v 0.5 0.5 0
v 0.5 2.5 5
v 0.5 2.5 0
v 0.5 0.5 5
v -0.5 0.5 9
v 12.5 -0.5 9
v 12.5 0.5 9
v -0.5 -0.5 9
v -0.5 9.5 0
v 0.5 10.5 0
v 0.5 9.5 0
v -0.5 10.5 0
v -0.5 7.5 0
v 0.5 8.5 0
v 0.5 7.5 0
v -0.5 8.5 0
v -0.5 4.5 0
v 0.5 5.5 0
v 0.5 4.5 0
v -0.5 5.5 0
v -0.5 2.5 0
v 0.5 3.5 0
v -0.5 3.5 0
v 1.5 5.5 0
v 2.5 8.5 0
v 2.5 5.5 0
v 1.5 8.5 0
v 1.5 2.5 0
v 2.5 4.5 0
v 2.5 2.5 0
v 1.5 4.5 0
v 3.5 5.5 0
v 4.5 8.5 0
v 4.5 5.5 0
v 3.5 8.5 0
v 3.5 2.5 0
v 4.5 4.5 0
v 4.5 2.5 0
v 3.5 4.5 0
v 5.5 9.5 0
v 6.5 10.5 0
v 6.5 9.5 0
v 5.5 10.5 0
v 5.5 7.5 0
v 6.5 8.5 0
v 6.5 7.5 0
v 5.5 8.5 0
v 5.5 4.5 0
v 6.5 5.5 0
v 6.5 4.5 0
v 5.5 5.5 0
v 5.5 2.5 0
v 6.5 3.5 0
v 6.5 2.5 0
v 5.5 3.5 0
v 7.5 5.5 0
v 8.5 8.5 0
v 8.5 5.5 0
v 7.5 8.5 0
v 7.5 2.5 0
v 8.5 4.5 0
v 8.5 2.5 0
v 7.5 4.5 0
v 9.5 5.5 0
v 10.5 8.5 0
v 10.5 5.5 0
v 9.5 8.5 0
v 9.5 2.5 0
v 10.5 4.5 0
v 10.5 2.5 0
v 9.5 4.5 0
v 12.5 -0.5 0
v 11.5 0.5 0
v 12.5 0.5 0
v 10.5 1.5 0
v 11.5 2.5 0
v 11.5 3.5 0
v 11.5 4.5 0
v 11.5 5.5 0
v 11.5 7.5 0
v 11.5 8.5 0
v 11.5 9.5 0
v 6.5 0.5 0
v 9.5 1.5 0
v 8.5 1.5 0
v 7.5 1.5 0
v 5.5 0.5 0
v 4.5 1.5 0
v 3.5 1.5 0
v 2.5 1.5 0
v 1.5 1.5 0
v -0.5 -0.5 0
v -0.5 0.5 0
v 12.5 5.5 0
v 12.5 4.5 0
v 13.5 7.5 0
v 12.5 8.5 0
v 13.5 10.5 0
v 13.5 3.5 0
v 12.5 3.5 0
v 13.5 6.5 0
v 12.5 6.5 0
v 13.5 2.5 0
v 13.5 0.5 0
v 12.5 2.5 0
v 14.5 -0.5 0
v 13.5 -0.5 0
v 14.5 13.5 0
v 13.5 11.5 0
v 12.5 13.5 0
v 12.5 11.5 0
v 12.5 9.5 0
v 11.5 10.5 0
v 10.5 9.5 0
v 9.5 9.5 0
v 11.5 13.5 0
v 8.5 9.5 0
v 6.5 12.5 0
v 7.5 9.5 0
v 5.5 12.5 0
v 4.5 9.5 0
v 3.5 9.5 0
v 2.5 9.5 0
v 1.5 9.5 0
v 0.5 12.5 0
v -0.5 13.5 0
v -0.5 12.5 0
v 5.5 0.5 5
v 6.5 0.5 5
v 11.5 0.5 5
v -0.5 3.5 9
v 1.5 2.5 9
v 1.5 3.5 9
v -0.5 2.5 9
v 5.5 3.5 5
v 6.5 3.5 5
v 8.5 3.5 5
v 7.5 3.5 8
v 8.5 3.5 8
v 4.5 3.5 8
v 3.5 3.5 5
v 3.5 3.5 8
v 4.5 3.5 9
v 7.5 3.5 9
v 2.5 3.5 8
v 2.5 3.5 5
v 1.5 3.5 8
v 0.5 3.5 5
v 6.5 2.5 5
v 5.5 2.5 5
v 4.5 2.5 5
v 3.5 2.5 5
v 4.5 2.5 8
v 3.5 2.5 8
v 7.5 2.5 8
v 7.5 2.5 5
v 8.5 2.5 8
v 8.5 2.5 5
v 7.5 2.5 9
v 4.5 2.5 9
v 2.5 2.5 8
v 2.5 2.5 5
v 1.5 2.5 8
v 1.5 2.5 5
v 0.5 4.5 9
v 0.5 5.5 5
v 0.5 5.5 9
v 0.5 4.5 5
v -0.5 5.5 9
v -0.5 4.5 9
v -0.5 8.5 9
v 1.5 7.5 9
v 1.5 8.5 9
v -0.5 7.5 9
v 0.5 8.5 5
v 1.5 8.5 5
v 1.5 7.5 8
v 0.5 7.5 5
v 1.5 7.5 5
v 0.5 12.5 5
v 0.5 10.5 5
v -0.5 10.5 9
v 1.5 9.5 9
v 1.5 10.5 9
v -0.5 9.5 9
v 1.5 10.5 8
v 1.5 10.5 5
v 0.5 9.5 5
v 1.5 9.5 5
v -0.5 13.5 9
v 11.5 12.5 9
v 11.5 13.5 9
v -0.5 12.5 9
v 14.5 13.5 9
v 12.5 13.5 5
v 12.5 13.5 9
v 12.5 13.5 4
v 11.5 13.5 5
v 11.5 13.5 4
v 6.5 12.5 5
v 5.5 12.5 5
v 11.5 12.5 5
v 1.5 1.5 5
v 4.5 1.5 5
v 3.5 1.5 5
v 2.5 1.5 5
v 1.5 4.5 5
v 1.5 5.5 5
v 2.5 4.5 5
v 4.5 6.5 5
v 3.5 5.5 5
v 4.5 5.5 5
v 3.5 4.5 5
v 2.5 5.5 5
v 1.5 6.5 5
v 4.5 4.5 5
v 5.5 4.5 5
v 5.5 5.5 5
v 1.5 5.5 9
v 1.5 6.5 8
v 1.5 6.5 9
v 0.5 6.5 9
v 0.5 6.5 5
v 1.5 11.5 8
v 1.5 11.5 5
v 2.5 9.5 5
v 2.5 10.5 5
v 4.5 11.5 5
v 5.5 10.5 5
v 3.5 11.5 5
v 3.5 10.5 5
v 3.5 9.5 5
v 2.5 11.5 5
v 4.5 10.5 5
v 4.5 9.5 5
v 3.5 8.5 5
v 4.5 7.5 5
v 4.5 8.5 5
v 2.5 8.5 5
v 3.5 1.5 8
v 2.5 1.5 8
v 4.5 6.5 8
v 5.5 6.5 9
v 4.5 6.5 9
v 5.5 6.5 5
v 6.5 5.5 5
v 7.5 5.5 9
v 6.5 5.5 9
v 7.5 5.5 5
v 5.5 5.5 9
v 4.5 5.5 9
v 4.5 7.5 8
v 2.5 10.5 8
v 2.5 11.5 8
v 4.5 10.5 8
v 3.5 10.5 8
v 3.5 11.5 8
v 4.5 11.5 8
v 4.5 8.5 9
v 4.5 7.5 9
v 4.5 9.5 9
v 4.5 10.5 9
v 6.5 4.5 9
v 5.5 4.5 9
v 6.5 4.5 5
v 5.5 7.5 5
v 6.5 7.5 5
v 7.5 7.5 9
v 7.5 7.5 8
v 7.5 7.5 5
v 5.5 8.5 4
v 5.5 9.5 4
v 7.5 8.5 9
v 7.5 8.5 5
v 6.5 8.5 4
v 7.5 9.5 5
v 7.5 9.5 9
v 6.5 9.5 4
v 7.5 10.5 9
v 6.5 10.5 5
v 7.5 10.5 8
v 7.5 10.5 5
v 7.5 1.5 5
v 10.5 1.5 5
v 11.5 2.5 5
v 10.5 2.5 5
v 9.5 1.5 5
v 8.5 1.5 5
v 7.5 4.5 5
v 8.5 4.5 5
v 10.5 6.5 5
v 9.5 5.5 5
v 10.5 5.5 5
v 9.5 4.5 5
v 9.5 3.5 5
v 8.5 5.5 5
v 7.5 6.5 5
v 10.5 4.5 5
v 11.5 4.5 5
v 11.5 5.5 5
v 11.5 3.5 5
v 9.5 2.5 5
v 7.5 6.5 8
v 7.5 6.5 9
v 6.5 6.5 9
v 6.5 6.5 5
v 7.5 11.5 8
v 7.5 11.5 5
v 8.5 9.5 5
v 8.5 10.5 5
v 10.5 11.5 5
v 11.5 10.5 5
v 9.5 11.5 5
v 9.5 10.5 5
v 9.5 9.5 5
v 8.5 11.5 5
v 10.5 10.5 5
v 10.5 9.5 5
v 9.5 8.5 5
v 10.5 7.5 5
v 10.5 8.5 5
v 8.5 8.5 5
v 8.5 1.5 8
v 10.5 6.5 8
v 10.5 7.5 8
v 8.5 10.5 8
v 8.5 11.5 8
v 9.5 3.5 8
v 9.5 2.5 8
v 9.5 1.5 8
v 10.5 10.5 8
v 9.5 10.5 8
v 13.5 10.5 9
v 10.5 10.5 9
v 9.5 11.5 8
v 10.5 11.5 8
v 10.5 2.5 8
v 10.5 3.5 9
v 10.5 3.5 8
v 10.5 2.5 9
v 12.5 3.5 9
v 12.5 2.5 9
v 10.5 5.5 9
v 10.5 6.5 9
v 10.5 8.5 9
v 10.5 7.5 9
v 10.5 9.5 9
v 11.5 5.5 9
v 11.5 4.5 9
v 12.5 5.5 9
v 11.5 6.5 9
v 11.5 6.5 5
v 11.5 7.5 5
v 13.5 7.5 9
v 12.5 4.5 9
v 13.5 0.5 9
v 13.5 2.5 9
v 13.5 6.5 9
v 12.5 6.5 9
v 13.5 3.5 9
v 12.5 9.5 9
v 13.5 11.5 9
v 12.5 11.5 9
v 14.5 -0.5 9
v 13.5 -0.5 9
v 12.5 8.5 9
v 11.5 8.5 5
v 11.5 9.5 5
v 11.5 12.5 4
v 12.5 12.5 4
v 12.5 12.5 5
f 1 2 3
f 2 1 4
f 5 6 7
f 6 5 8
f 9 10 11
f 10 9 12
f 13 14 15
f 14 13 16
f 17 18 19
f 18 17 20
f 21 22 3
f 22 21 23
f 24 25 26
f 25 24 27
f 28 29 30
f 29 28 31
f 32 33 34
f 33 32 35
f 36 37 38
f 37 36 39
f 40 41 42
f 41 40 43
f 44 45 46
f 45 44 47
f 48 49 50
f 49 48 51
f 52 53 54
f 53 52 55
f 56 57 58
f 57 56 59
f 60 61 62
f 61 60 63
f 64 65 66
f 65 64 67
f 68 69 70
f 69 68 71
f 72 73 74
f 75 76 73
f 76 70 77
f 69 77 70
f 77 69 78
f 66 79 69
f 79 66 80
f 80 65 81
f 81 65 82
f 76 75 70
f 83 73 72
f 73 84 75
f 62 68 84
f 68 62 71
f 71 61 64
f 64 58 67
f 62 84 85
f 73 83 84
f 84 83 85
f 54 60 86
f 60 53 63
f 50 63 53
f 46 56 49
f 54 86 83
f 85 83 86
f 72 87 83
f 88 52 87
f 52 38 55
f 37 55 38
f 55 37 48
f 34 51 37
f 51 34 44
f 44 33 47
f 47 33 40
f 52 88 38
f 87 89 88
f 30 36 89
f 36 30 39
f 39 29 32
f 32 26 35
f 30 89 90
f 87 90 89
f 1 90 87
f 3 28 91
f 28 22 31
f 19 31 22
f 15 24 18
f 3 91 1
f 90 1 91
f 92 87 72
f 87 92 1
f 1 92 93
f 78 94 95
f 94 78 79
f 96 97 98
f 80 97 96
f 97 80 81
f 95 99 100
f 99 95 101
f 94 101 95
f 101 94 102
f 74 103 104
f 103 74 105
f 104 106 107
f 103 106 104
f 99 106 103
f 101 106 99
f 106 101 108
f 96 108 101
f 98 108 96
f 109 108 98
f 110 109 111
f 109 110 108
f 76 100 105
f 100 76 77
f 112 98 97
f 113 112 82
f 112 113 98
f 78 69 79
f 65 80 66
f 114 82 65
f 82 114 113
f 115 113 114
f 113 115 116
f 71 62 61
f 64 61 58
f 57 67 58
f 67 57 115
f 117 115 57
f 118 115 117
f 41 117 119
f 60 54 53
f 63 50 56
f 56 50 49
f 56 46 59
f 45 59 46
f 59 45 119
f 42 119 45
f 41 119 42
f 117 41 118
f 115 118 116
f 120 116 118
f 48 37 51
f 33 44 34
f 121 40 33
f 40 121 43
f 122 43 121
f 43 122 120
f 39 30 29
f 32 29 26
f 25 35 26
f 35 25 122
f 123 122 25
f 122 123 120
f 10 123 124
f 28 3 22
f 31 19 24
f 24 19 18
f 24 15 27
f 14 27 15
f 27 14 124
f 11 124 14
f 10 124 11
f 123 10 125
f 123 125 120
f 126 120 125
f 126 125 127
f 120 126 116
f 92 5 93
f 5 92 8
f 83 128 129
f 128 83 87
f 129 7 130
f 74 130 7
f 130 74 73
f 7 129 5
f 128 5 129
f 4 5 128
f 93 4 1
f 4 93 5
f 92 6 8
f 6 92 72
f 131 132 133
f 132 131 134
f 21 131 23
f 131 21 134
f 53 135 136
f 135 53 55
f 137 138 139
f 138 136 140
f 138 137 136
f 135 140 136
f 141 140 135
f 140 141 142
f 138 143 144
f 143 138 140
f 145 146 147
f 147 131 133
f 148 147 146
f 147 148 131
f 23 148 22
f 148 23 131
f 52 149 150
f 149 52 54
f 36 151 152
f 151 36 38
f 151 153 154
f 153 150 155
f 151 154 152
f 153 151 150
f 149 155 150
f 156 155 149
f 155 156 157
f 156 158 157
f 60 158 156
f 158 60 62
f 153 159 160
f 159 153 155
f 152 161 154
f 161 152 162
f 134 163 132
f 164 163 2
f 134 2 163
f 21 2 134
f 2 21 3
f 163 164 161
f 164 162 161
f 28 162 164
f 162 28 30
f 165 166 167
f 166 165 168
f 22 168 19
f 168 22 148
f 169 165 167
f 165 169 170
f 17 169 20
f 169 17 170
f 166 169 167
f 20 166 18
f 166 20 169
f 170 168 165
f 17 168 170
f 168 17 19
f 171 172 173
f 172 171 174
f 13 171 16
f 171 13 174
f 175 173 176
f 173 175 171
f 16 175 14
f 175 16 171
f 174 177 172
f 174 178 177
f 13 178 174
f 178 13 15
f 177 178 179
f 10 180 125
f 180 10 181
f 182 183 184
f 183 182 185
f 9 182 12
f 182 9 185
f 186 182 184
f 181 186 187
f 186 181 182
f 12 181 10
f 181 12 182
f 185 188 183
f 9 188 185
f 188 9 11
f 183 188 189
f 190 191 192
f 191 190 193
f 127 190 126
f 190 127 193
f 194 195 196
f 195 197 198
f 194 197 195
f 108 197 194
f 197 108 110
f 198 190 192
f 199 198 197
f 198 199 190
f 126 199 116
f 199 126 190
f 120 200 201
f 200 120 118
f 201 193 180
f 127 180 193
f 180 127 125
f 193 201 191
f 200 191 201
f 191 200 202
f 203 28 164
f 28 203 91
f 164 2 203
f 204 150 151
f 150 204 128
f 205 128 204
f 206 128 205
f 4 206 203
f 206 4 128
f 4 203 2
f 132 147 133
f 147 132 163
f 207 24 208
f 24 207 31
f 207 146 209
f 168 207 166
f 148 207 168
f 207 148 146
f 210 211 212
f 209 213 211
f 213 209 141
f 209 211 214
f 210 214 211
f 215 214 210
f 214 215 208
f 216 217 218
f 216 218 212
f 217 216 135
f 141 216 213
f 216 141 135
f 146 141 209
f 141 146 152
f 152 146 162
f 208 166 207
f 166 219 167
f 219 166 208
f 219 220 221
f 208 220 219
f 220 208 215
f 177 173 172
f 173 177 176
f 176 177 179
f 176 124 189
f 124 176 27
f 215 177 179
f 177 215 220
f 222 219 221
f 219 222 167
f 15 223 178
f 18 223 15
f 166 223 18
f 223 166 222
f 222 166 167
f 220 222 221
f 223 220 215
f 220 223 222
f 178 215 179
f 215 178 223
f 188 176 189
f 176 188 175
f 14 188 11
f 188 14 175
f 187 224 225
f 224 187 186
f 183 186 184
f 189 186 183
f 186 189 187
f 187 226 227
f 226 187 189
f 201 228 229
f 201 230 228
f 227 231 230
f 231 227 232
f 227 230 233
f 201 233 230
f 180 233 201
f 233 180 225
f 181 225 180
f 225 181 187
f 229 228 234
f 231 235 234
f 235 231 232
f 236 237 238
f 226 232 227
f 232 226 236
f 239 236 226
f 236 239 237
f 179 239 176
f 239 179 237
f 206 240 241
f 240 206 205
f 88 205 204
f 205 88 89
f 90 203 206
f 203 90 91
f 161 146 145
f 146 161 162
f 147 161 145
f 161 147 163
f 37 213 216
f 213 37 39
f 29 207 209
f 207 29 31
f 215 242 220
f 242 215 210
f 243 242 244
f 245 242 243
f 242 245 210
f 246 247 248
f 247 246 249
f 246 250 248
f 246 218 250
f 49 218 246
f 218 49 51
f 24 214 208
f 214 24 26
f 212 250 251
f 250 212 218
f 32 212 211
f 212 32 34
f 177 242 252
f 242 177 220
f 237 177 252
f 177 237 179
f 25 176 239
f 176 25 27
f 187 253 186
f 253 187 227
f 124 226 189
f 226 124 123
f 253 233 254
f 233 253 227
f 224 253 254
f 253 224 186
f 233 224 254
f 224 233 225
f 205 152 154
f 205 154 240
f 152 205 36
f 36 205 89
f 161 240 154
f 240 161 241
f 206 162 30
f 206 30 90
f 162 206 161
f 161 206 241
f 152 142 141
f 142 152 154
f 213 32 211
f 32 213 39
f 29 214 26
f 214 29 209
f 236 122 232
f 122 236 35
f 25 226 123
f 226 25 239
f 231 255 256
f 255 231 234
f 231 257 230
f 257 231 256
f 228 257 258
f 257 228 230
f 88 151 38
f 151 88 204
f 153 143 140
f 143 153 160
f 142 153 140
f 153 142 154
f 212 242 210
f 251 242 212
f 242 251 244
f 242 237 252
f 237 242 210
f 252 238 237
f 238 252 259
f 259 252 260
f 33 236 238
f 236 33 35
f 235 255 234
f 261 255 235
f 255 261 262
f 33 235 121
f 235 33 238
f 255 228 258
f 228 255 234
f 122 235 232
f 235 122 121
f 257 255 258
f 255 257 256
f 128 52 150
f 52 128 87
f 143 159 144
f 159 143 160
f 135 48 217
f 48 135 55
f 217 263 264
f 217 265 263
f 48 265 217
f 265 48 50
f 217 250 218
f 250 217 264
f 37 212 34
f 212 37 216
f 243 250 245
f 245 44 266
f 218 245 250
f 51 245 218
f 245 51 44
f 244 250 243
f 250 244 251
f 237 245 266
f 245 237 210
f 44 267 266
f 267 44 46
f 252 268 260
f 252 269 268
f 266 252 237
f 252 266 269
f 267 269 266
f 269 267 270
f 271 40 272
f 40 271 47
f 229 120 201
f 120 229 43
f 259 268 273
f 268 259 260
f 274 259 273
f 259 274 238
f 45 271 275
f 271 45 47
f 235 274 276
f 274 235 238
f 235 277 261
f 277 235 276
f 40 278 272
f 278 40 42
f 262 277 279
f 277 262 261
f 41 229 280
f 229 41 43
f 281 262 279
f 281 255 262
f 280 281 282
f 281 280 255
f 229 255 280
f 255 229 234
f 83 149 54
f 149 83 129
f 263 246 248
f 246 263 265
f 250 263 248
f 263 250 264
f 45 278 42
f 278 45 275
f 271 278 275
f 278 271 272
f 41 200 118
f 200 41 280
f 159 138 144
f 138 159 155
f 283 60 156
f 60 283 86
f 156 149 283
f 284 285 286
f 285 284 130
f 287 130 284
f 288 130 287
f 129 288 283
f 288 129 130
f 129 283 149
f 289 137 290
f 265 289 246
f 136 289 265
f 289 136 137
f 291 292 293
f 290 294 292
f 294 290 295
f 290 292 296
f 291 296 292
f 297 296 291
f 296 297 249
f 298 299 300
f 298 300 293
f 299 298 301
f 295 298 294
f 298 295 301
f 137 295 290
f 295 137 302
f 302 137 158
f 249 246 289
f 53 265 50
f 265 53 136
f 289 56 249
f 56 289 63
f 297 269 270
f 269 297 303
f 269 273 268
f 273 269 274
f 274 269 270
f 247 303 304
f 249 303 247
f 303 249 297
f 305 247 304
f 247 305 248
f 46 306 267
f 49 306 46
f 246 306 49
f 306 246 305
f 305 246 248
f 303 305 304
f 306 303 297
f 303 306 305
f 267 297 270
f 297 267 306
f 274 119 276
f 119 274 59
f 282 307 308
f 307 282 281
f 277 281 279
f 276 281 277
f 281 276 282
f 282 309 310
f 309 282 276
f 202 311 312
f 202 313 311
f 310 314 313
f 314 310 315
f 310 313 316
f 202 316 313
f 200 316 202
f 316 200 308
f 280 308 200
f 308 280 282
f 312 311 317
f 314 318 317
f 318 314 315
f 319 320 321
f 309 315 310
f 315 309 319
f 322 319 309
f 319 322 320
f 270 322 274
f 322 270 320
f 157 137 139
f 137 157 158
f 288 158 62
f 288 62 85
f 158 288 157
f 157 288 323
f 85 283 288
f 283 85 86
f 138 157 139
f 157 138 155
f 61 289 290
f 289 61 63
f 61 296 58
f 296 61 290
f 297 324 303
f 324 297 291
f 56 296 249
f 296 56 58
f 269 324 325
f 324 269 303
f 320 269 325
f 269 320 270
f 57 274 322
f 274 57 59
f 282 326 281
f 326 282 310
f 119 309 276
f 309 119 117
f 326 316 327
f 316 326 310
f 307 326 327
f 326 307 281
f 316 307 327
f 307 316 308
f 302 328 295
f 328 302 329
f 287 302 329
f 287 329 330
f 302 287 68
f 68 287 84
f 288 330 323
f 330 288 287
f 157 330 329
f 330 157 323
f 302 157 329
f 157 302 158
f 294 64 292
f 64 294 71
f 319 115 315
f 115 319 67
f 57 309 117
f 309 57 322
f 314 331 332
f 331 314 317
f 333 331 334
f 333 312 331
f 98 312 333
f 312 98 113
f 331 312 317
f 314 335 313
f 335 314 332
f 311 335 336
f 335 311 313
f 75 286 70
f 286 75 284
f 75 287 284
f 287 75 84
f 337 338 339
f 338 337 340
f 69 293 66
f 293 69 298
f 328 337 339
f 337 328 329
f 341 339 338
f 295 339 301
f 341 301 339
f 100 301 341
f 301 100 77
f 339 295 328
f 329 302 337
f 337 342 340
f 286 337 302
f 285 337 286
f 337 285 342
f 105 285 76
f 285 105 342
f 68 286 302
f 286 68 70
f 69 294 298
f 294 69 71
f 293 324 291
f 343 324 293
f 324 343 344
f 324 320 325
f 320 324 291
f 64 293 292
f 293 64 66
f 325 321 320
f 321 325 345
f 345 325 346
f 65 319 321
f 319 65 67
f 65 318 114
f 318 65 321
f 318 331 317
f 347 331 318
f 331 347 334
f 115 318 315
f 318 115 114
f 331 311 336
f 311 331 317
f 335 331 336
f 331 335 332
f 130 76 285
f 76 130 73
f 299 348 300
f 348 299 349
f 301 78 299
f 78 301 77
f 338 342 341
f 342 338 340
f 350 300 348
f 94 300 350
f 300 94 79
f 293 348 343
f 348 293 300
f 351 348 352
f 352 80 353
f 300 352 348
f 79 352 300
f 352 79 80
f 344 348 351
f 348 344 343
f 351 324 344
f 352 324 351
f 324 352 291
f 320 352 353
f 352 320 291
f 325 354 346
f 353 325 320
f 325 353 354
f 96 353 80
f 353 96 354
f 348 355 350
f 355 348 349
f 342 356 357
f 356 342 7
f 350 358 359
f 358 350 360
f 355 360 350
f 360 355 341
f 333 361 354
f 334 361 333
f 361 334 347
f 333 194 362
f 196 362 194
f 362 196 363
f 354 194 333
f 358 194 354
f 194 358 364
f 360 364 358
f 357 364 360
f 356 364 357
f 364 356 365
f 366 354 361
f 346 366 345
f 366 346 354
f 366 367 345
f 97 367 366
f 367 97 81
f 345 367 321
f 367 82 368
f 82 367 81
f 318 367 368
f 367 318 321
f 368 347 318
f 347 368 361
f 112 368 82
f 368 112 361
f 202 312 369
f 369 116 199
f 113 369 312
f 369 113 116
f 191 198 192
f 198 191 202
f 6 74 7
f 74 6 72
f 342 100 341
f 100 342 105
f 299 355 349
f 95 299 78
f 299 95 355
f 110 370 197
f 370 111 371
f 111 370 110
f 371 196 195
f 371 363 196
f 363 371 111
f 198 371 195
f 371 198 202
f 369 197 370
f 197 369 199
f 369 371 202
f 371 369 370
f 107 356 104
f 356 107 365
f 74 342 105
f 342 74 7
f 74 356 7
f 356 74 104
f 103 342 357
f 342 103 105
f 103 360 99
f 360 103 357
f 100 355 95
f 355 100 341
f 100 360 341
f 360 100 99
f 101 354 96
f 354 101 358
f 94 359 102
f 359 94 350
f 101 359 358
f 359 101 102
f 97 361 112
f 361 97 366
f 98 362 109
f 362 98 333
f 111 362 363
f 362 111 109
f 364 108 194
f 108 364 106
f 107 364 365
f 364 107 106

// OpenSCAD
union() {
    translate([0, 0, 4.5]) cube([1, 1, 9], center=true);
    translate([0, 3, 4.5]) cube([1, 1, 9], center=true);
    translate([0, 5, 4.5]) cube([1, 1, 9], center=true);
    translate([0, 8, 4.5]) cube([1, 1, 9], center=true);
    translate([0, 10, 4.5]) cube([1, 1, 9], center=true);
    translate([0, 13, 4.5]) cube([1, 1, 9], center=true);
    translate([1, 0, 4.5]) cube([1, 1, 9], center=true);
    translate([1, 1, 2.5]) cube([1, 1, 5], center=true);
    translate([1, 2, 2.5]) cube([1, 1, 5], center=true);
    translate([1, 3, 4.5]) cube([1, 1, 9], center=true);
    translate([1, 4, 2.5]) cube([1, 1, 5], center=true);
    translate([1, 5, 2.5]) cube([1, 1, 5], center=true);
    translate([1, 6, 4.5]) cube([1, 1, 9], center=true);
    translate([1, 7, 2.5]) cube([1, 1, 5], center=true);
    translate([1, 8, 4.5]) cube([1, 1, 9], center=true);
    translate([1, 9, 2.5]) cube([1, 1, 5], center=true);
    translate([1, 10, 4.5]) cube([1, 1, 9], center=true);
    translate([1, 11, 2.5]) cube([1, 1, 5], center=true);
    translate([1, 12, 2.5]) cube([1, 1, 5], center=true);
    translate([1, 13, 4.5]) cube([1, 1, 9], center=true);
    translate([2, 0, 4.5]) cube([1, 1, 9], center=true);
    translate([2, 1, 2.5]) cube([1, 1, 5], center=true);
    translate([2, 3, 4.0]) cube([1, 1, 8], center=true);
    translate([2, 4, 2.5]) cube([1, 1, 5], center=true);
    translate([2, 6, 2.5]) cube([1, 1, 5], center=true);
    translate([2, 7, 4.0]) cube([1, 1, 8], center=true);
    translate([2, 8, 2.5]) cube([1, 1, 5], center=true);
    translate([2, 10, 2.5]) cube([1, 1, 5], center=true);
    translate([2, 11, 4.0]) cube([1, 1, 8], center=true);
    translate([2, 12, 2.5]) cube([1, 1, 5], center=true);
    translate([2, 13, 4.5]) cube([1, 1, 9], center=true);
    translate([3, 0, 4.5]) cube([1, 1, 9], center=true);
    translate([3, 1, 2.5]) cube([1, 1, 5], center=true);
    translate([3, 2, 4.0]) cube([1, 1, 8], center=true);
    translate([3, 3, 2.5]) cube([1, 1, 5], center=true);
    translate([3, 4, 2.5]) cube([1, 1, 5], center=true);
    translate([3, 5, 2.5]) cube([1, 1, 5], center=true);
    translate([3, 6, 2.5]) cube([1, 1, 5], center=true);
    translate([3, 7, 4.0]) cube([1, 1, 8], center=true);
    translate([3, 8, 2.5]) cube([1, 1, 5], center=true);
    translate([3, 9, 2.5]) cube([1, 1, 5], center=true);
    translate([3, 10, 2.5]) cube([1, 1, 5], center=true);
    translate([3, 11, 2.5]) cube([1, 1, 5], center=true);
    translate([3, 12, 2.5]) cube([1, 1, 5], center=true);
    translate([3, 13, 4.5]) cube([1, 1, 9], center=true);
    translate([4, 0, 4.5]) cube([1, 1, 9], center=true);
    translate([4, 1, 2.5]) cube([1, 1, 5], center=true);
    translate([4, 3, 4.0]) cube([1, 1, 8], center=true);
    translate([4, 4, 2.5]) cube([1, 1, 5], center=true);
    translate([4, 6, 2.5]) cube([1, 1, 5], center=true);
    translate([4, 7, 4.0]) cube([1, 1, 8], center=true);
    translate([4, 8, 2.5]) cube([1, 1, 5], center=true);
    translate([4, 10, 2.5]) cube([1, 1, 5], center=true);
    translate([4, 11, 4.0]) cube([1, 1, 8], center=true);
    translate([4, 12, 2.5]) cube([1, 1, 5], center=true);
    translate([4, 13, 4.5]) cube([1, 1, 9], center=true);
    translate([5, 0, 4.5]) cube([1, 1, 9], center=true);
    translate([5, 1, 2.5]) cube([1, 1, 5], center=true);
    translate([5, 2, 2.5]) cube([1, 1, 5], center=true);
    translate([5, 3, 4.5]) cube([1, 1, 9], center=true);
    translate([5, 4, 2.5]) cube([1, 1, 5], center=true);
    translate([5, 5, 2.5]) cube([1, 1, 5], center=true);
    translate([5, 6, 4.5]) cube([1, 1, 9], center=true);
    translate([5, 7, 2.5]) cube([1, 1, 5], center=true);
    translate([5, 8, 4.5]) cube([1, 1, 9], center=true);
    translate([5, 9, 2.5]) cube([1, 1, 5], center=true);
    translate([5, 10, 4.5]) cube([1, 1, 9], center=true);
    translate([5, 11, 2.5]) cube([1, 1, 5], center=true);
    translate([5, 12, 2.5]) cube([1, 1, 5], center=true);
    translate([5, 13, 4.5]) cube([1, 1, 9], center=true);
    translate([6, 0, 4.5]) cube([1, 1, 9], center=true);
    translate([6, 3, 4.5]) cube([1, 1, 9], center=true);
    translate([6, 5, 4.5]) cube([1, 1, 9], center=true);
    translate([6, 8, 4.5]) cube([1, 1, 9], center=true);
    translate([6, 9, 4.5]) color([1, 0, 0]) cube([1, 1, 1], center=true);
    translate([6, 10, 4.5]) cube([1, 1, 9], center=true);
    translate([6, 13, 4.5]) cube([1, 1, 9], center=true);
    translate([7, 0, 4.5]) cube([1, 1, 9], center=true);
    translate([7, 1, 2.5]) cube([1, 1, 5], center=true);
    translate([7, 2, 2.5]) cube([1, 1, 5], center=true);
    translate([7, 3, 4.5]) cube([1, 1, 9], center=true);
    translate([7, 4, 2.5]) cube([1, 1, 5], center=true);
    translate([7, 5, 2.5]) cube([1, 1, 5], center=true);
    translate([7, 6, 4.5]) cube([1, 1, 9], center=true);
    translate([7, 7, 2.5]) cube([1, 1, 5], center=true);
    translate([7, 8, 4.5]) cube([1, 1, 9], center=true);
    translate([7, 9, 2.5]) cube([1, 1, 5], center=true);
    translate([7, 10, 4.5]) cube([1, 1, 9], center=true);
    translate([7, 11, 2.5]) cube([1, 1, 5], center=true);
    translate([7, 12, 2.5]) cube([1, 1, 5], center=true);
    translate([7, 13, 4.5]) cube([1, 1, 9], center=true);
    translate([8, 0, 4.5]) cube([1, 1, 9], center=true);
    translate([8, 1, 2.5]) cube([1, 1, 5], center=true);
    translate([8, 3, 4.0]) cube([1, 1, 8], center=true);
    translate([8, 4, 2.5]) cube([1, 1, 5], center=true);
    translate([8, 6, 2.5]) cube([1, 1, 5], center=true);
    translate([8, 7, 4.0]) cube([1, 1, 8], center=true);
    translate([8, 8, 2.5]) cube([1, 1, 5], center=true);
    translate([8, 10, 2.5]) cube([1, 1, 5], center=true);
    translate([8, 11, 4.0]) cube([1, 1, 8], center=true);
    translate([8, 12, 2.5]) cube([1, 1, 5], center=true);
    translate([8, 13, 4.5]) cube([1, 1, 9], center=true);
    translate([9, 0, 4.5]) cube([1, 1, 9], center=true);
    translate([9, 1, 2.5]) cube([1, 1, 5], center=true);
    translate([9, 2, 4.0]) cube([1, 1, 8], center=true);
    translate([9, 3, 2.5]) cube([1, 1, 5], center=true);
    translate([9, 4, 2.5]) cube([1, 1, 5], center=true);
    translate([9, 5, 2.5]) cube([1, 1, 5], center=true);
    translate([9, 6, 2.5]) cube([1, 1, 5], center=true);
    translate([9, 7, 4.0]) cube([1, 1, 8], center=true);
    translate([9, 8, 2.5]) cube([1, 1, 5], center=true);
    translate([9, 9, 2.5]) cube([1, 1, 5], center=true);
    translate([9, 10, 2.5]) cube([1, 1, 5], center=true);
    translate([9, 11, 2.5]) cube([1, 1, 5], center=true);
    translate([9, 12, 2.5]) cube([1, 1, 5], center=true);
    translate([9, 13, 4.5]) cube([1, 1, 9], center=true);
    translate([10, 0, 4.5]) cube([1, 1, 9], center=true);
    translate([10, 1, 2.5]) cube([1, 1, 5], center=true);
    translate([10, 3, 4.0]) cube([1, 1, 8], center=true);
    translate([10, 4, 2.5]) cube([1, 1, 5], center=true);
    translate([10, 6, 2.5]) cube([1, 1, 5], center=true);
    translate([10, 7, 4.0]) cube([1, 1, 8], center=true);
    translate([10, 8, 2.5]) cube([1, 1, 5], center=true);
    translate([10, 10, 2.5]) cube([1, 1, 5], center=true);
    translate([10, 11, 4.0]) cube([1, 1, 8], center=true);
    translate([10, 12, 2.5]) cube([1, 1, 5], center=true);
    translate([10, 13, 4.5]) cube([1, 1, 9], center=true);
    translate([11, 0, 4.5]) cube([1, 1, 9], center=true);
    translate([11, 1, 2.5]) cube([1, 1, 5], center=true);
    translate([11, 2, 2.5]) cube([1, 1, 5], center=true);
    translate([11, 3, 4.5]) cube([1, 1, 9], center=true);
    translate([11, 4, 2.5]) cube([1, 1, 5], center=true);
    translate([11, 5, 2.5]) cube([1, 1, 5], center=true);
    translate([11, 6, 4.5]) cube([1, 1, 9], center=true);
    translate([11, 7, 2.5]) cube([1, 1, 5], center=true);
    translate([11, 8, 4.5]) cube([1, 1, 9], center=true);
    translate([11, 9, 2.5]) cube([1, 1, 5], center=true);
    translate([11, 10, 4.5]) cube([1, 1, 9], center=true);
    translate([11, 11, 2.5]) cube([1, 1, 5], center=true);
    translate([11, 12, 2.5]) cube([1, 1, 5], center=true);
    translate([11, 13, 4.5]) cube([1, 1, 9], center=true);
    translate([12, 0, 4.5]) cube([1, 1, 9], center=true);
    translate([12, 3, 4.5]) cube([1, 1, 9], center=true);
    translate([12, 5, 4.5]) cube([1, 1, 9], center=true);
    translate([12, 8, 4.5]) cube([1, 1, 9], center=true);
    translate([12, 10, 4.5]) cube([1, 1, 9], center=true);
    translate([12, 13, 4.5]) color([0, 0, 1]) cube([1, 1, 1], center=true);
    translate([13, 1, 4.5]) cube([1, 1, 9], center=true);
    translate([13, 2, 4.5]) cube([1, 1, 9], center=true);
    translate([13, 4, 4.5]) cube([1, 1, 9], center=true);
    translate([13, 5, 4.5]) cube([1, 1, 9], center=true);
    translate([13, 6, 4.5]) cube([1, 1, 9], center=true);
    translate([13, 8, 4.5]) cube([1, 1, 9], center=true);
    translate([13, 9, 4.5]) cube([1, 1, 9], center=true);
    translate([13, 10, 4.5]) cube([1, 1, 9], center=true);
    translate([13, 12, 4.5]) cube([1, 1, 9], center=true);
    translate([13, 13, 4.5]) cube([1, 1, 9], center=true);
    translate([14, 0, 4.5]) cube([1, 1, 9], center=true);
    translate([14, 1, 4.5]) cube([1, 1, 9], center=true);
    translate([14, 2, 4.5]) cube([1, 1, 9], center=true);
    translate([14, 3, 4.5]) cube([1, 1, 9], center=true);
    translate([14, 4, 4.5]) cube([1, 1, 9], center=true);
    translate([14, 5, 4.5]) cube([1, 1, 9], center=true);
    translate([14, 6, 4.5]) cube([1, 1, 9], center=true);
    translate([14, 7, 4.5]) cube([1, 1, 9], center=true);
    translate([14, 8, 4.5]) cube([1, 1, 9], center=true);
    translate([14, 9, 4.5]) cube([1, 1, 9], center=true);
    translate([14, 10, 4.5]) cube([1, 1, 9], center=true);
    translate([14, 11, 4.5]) cube([1, 1, 9], center=true);
    translate([14, 12, 4.5]) cube([1, 1, 9], center=true);
    translate([14, 13, 4.5]) cube([1, 1, 9], center=true);
}
